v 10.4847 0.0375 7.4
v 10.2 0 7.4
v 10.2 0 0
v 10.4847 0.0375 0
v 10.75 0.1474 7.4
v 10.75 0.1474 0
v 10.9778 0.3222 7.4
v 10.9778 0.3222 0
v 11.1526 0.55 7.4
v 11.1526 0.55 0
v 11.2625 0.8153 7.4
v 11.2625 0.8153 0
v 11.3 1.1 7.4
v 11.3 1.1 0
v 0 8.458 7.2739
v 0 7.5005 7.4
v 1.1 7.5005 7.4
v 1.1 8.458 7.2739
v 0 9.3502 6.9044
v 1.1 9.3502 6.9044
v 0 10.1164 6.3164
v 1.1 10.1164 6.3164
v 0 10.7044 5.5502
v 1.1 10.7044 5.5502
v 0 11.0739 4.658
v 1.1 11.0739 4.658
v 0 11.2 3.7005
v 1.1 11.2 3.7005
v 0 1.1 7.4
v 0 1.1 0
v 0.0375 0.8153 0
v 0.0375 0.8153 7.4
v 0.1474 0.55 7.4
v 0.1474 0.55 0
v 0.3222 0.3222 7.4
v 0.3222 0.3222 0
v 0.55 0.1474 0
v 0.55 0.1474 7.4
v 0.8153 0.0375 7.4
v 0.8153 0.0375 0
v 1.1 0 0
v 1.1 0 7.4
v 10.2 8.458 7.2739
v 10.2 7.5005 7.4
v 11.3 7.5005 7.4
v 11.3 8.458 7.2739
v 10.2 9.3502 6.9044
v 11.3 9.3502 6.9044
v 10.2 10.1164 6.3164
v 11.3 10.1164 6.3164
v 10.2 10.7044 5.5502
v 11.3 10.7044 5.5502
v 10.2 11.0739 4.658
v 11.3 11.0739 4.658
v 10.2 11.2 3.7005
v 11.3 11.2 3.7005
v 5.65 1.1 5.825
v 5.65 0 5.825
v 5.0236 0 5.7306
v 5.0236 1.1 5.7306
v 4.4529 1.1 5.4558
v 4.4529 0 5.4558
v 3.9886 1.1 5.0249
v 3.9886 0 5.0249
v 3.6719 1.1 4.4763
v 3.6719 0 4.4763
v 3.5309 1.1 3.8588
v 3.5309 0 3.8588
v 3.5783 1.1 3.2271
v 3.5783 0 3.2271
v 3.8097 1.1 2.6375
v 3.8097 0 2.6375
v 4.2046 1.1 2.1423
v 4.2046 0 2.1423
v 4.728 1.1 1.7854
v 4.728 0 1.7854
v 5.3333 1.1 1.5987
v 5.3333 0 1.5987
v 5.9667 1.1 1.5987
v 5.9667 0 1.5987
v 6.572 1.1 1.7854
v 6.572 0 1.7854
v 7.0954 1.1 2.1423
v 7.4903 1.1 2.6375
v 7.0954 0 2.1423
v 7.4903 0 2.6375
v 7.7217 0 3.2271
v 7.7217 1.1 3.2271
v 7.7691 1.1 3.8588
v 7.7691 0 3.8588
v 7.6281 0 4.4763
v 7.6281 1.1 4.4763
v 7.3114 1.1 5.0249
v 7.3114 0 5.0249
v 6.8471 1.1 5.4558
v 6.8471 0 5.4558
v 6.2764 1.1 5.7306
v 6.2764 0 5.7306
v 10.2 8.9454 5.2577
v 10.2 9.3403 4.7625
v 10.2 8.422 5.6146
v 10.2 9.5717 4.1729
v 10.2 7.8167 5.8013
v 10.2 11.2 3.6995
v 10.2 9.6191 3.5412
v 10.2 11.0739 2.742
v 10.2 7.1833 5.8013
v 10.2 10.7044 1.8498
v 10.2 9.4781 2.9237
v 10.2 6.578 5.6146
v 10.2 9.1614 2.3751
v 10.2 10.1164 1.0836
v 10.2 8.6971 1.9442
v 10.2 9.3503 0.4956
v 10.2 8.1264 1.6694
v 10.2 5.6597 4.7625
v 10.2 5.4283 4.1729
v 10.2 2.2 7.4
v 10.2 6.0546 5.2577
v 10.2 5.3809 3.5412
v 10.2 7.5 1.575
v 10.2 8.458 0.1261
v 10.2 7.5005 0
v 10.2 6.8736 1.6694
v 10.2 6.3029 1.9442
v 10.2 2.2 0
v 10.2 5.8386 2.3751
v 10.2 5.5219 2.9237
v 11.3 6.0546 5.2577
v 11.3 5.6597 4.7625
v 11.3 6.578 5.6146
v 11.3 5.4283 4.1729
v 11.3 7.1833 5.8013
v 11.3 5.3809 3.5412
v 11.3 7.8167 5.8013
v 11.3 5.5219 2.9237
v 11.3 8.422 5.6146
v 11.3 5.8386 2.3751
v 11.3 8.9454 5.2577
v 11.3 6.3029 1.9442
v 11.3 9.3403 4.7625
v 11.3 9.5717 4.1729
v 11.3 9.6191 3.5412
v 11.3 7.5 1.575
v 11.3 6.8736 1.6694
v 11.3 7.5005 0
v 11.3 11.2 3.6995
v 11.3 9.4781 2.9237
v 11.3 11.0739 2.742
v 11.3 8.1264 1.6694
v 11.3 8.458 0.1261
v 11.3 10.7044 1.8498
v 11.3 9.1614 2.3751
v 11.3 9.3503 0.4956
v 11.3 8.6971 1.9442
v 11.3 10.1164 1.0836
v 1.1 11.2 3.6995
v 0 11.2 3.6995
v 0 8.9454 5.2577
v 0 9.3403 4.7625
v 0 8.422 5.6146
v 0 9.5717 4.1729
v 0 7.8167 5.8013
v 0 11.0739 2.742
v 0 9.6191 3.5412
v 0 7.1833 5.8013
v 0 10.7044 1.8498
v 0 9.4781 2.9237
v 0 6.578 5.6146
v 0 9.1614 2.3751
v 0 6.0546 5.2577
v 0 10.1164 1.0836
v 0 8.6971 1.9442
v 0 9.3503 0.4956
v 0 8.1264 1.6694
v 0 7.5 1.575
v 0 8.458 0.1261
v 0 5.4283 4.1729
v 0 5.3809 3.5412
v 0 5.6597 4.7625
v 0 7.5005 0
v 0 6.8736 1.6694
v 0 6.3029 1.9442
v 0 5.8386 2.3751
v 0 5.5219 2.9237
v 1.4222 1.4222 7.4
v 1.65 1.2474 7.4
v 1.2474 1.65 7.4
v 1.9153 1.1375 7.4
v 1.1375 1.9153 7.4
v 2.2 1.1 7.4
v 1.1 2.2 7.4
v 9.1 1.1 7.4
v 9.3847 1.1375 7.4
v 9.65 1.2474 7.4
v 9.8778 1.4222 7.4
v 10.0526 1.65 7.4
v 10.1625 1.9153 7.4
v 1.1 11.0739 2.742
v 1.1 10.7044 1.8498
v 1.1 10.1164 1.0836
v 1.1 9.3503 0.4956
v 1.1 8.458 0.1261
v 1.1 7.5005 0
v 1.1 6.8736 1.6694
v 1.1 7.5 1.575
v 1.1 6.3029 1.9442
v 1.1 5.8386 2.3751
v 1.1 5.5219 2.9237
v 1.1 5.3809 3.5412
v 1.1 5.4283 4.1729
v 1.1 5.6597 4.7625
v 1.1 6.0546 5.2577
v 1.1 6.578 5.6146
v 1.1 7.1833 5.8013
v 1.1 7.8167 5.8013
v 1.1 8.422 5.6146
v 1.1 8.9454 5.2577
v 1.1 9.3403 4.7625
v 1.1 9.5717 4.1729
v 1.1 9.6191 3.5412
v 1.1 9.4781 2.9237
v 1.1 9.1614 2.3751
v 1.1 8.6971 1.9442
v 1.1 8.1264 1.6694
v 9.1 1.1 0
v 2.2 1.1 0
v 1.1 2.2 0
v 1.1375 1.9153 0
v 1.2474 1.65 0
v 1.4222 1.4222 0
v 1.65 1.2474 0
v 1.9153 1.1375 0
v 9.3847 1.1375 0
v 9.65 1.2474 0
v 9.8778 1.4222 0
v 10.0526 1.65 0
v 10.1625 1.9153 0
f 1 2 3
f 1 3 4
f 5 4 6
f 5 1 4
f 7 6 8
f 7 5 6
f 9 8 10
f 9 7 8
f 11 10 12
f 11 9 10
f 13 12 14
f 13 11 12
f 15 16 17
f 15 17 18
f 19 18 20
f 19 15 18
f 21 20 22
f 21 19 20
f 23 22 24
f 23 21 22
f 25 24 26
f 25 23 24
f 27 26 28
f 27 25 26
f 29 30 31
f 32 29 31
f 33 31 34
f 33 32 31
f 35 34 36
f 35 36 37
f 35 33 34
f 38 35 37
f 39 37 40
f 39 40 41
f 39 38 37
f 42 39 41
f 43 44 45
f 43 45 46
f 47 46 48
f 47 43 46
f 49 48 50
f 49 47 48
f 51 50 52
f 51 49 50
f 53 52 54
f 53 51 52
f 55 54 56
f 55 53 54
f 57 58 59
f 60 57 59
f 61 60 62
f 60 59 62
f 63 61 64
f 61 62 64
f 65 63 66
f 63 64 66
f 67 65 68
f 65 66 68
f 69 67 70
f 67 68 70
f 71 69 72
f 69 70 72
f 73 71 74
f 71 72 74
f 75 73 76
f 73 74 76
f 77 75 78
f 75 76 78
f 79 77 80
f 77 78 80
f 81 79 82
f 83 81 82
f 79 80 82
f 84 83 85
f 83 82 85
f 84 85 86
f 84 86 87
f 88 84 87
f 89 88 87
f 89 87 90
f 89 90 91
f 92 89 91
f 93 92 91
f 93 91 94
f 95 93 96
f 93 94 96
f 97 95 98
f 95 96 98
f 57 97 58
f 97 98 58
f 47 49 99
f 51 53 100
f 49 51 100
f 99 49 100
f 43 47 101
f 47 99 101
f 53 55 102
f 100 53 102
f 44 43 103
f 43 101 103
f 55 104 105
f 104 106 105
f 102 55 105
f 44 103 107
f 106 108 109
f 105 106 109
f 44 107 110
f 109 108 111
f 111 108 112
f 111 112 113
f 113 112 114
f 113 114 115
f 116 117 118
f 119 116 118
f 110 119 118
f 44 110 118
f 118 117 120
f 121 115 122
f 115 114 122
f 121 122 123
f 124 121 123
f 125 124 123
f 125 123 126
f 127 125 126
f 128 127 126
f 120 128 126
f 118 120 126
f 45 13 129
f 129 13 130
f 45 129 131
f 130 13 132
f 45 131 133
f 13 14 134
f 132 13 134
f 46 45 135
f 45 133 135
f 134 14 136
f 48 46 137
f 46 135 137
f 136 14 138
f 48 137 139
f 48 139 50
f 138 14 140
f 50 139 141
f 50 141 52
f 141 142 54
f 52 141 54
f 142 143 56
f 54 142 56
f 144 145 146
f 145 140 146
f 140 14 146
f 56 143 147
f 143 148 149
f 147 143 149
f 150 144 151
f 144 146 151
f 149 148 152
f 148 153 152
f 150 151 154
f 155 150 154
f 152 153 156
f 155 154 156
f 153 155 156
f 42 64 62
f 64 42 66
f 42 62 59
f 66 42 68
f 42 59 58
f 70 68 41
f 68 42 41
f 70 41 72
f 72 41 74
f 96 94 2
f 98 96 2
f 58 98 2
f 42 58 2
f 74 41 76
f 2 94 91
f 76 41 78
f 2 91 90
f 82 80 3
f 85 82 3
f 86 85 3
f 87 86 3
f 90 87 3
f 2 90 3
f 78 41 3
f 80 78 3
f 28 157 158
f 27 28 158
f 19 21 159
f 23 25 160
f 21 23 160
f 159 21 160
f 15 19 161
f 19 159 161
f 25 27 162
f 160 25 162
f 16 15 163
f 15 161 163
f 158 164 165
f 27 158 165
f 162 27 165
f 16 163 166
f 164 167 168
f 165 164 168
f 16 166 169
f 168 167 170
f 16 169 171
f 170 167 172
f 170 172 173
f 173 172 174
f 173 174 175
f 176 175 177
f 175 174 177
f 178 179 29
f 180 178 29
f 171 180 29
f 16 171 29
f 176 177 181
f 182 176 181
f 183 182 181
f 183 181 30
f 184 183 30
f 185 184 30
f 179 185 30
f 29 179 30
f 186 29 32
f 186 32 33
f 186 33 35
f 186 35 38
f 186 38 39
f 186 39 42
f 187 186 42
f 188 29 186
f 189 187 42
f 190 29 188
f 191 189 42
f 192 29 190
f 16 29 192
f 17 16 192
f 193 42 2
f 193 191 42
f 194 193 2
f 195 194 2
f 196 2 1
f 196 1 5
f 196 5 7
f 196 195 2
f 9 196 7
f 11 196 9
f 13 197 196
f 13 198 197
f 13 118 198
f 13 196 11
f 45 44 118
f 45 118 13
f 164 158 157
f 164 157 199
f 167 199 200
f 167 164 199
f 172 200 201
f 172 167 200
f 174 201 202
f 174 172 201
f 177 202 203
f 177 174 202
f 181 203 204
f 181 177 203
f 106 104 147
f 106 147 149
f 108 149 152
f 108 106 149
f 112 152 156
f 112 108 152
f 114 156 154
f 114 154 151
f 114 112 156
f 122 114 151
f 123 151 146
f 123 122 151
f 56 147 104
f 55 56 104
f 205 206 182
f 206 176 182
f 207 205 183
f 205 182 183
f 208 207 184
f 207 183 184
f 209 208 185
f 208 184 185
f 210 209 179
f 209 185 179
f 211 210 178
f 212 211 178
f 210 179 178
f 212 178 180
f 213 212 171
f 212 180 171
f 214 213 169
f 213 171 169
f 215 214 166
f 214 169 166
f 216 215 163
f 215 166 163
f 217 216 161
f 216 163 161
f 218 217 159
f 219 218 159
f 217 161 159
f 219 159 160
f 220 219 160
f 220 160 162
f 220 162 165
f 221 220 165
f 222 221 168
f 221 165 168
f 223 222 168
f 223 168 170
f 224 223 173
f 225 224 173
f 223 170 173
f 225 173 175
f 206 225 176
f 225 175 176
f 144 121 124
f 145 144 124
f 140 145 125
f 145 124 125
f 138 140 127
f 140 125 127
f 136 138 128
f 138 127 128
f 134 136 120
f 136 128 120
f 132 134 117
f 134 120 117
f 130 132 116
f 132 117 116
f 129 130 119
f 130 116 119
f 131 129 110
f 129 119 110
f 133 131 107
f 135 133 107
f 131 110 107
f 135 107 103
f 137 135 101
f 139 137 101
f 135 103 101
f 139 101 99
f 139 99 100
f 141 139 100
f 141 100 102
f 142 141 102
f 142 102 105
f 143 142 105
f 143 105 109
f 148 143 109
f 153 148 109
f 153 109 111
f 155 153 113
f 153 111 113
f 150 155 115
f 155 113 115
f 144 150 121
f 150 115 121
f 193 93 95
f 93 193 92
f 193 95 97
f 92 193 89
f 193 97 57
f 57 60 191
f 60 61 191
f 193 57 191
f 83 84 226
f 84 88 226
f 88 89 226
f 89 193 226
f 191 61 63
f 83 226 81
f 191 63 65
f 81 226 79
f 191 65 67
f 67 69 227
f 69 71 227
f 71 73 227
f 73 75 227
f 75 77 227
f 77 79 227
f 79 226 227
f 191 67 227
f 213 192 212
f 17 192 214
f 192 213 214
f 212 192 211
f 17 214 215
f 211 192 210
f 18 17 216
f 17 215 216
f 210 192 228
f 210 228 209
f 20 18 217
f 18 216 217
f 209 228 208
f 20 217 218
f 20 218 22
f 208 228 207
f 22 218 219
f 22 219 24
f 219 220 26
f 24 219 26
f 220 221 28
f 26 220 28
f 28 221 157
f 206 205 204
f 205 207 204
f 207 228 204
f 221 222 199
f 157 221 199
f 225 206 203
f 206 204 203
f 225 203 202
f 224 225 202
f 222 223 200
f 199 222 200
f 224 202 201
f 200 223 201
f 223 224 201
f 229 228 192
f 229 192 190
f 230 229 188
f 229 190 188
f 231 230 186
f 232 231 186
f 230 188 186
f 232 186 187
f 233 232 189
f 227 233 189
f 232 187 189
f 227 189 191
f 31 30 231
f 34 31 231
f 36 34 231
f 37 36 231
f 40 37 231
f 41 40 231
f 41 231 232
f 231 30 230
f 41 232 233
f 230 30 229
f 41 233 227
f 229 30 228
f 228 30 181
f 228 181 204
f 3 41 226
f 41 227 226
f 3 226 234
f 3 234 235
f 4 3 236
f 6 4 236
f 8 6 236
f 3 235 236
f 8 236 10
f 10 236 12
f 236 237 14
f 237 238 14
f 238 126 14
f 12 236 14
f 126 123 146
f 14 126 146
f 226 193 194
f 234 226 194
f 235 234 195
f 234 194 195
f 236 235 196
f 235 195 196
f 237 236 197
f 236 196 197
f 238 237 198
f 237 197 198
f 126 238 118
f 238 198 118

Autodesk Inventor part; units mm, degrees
ref_plane "YZ Plane" through (0, 0, 0) normal (1, 0, 0) x (0, 1, 0)
ref_plane "XZ Plane" through (0, 0, 0) normal (0, 1, 0) x (-1, 0, 0)
ref_plane "XY Plane" through (0, 0, 0) normal (0, 0, 1) x (1, 0, 0)
sketch "Sketch1" plane through (0, 0, 0) normal (0, 0, 1) x (1, 0, 0)
  line L0 (0, 0) -> (11.3, 0)
  line L1 (11.3, 0) -> (11.3, 11.2)
  line L2 (11.3, 11.2) -> (10.2, 11.2)
  line L3 (10.2, 11.2) -> (10.2, 1.1)
  line L4 (10.2, 1.1) -> (1.1, 1.1)
  line L5 (1.1, 1.1) -> (1.1, 11.2)
  line L6 (1.1, 11.2) -> (0, 11.2)
  line L7 (0, 11.2) -> (0, 0)
  dimension "d0" = 1.1
  dimension "d1" = 1.1
  dimension "d2" = 11.3
  dimension "d3" = 11.2
extrude "Extrusion1" add sketch "Sketch1" along normal blind 7.4
fillet "Fillet1" radius 3.7 4 edges at (10.75, 11.2, 7.4) (10.75, 11.2, 0) (0.55, 11.2, 7.4) (0.55, 11.2, 0)
sketch "Sketch2" plane through (11.3, 0, 7.4) normal (1, 0, 0) x (0, 0, -1)
  line L0 (7.4, 0) -> (0, 0) projected
  point P0 (3.7, 7.5)
  dimension "d14" = 7.5
hole "Hole1" at (11.3, 7.5, 3.7) direction (-1, 0, 0) diameter 4.25 depth 14 tip angle 118
fillet "Fillet2" radius 1.1 4 edges at (1.1, 1.1, 3.7) (0, 0, 3.7) (11.3, 0, 3.7) (10.2, 1.1, 3.7)
sketch "Sketch3" plane through (2.2, 1.1, 0) normal (0, 1, 0) x (1, 0, 0)
  line L0 (6.9, 0) -> (0, 0) projected
  point P0 (-2.2, 0)
  point P1 (3.45, -3.7)
  point P2 (3.45, 0)
hole "Hole2" at (5.65, 1.1, 3.7) direction (0, -1, 0) diameter 4.25 depth 14 tip angle 118
properties part number "Linear Actuator Rear Mount"
